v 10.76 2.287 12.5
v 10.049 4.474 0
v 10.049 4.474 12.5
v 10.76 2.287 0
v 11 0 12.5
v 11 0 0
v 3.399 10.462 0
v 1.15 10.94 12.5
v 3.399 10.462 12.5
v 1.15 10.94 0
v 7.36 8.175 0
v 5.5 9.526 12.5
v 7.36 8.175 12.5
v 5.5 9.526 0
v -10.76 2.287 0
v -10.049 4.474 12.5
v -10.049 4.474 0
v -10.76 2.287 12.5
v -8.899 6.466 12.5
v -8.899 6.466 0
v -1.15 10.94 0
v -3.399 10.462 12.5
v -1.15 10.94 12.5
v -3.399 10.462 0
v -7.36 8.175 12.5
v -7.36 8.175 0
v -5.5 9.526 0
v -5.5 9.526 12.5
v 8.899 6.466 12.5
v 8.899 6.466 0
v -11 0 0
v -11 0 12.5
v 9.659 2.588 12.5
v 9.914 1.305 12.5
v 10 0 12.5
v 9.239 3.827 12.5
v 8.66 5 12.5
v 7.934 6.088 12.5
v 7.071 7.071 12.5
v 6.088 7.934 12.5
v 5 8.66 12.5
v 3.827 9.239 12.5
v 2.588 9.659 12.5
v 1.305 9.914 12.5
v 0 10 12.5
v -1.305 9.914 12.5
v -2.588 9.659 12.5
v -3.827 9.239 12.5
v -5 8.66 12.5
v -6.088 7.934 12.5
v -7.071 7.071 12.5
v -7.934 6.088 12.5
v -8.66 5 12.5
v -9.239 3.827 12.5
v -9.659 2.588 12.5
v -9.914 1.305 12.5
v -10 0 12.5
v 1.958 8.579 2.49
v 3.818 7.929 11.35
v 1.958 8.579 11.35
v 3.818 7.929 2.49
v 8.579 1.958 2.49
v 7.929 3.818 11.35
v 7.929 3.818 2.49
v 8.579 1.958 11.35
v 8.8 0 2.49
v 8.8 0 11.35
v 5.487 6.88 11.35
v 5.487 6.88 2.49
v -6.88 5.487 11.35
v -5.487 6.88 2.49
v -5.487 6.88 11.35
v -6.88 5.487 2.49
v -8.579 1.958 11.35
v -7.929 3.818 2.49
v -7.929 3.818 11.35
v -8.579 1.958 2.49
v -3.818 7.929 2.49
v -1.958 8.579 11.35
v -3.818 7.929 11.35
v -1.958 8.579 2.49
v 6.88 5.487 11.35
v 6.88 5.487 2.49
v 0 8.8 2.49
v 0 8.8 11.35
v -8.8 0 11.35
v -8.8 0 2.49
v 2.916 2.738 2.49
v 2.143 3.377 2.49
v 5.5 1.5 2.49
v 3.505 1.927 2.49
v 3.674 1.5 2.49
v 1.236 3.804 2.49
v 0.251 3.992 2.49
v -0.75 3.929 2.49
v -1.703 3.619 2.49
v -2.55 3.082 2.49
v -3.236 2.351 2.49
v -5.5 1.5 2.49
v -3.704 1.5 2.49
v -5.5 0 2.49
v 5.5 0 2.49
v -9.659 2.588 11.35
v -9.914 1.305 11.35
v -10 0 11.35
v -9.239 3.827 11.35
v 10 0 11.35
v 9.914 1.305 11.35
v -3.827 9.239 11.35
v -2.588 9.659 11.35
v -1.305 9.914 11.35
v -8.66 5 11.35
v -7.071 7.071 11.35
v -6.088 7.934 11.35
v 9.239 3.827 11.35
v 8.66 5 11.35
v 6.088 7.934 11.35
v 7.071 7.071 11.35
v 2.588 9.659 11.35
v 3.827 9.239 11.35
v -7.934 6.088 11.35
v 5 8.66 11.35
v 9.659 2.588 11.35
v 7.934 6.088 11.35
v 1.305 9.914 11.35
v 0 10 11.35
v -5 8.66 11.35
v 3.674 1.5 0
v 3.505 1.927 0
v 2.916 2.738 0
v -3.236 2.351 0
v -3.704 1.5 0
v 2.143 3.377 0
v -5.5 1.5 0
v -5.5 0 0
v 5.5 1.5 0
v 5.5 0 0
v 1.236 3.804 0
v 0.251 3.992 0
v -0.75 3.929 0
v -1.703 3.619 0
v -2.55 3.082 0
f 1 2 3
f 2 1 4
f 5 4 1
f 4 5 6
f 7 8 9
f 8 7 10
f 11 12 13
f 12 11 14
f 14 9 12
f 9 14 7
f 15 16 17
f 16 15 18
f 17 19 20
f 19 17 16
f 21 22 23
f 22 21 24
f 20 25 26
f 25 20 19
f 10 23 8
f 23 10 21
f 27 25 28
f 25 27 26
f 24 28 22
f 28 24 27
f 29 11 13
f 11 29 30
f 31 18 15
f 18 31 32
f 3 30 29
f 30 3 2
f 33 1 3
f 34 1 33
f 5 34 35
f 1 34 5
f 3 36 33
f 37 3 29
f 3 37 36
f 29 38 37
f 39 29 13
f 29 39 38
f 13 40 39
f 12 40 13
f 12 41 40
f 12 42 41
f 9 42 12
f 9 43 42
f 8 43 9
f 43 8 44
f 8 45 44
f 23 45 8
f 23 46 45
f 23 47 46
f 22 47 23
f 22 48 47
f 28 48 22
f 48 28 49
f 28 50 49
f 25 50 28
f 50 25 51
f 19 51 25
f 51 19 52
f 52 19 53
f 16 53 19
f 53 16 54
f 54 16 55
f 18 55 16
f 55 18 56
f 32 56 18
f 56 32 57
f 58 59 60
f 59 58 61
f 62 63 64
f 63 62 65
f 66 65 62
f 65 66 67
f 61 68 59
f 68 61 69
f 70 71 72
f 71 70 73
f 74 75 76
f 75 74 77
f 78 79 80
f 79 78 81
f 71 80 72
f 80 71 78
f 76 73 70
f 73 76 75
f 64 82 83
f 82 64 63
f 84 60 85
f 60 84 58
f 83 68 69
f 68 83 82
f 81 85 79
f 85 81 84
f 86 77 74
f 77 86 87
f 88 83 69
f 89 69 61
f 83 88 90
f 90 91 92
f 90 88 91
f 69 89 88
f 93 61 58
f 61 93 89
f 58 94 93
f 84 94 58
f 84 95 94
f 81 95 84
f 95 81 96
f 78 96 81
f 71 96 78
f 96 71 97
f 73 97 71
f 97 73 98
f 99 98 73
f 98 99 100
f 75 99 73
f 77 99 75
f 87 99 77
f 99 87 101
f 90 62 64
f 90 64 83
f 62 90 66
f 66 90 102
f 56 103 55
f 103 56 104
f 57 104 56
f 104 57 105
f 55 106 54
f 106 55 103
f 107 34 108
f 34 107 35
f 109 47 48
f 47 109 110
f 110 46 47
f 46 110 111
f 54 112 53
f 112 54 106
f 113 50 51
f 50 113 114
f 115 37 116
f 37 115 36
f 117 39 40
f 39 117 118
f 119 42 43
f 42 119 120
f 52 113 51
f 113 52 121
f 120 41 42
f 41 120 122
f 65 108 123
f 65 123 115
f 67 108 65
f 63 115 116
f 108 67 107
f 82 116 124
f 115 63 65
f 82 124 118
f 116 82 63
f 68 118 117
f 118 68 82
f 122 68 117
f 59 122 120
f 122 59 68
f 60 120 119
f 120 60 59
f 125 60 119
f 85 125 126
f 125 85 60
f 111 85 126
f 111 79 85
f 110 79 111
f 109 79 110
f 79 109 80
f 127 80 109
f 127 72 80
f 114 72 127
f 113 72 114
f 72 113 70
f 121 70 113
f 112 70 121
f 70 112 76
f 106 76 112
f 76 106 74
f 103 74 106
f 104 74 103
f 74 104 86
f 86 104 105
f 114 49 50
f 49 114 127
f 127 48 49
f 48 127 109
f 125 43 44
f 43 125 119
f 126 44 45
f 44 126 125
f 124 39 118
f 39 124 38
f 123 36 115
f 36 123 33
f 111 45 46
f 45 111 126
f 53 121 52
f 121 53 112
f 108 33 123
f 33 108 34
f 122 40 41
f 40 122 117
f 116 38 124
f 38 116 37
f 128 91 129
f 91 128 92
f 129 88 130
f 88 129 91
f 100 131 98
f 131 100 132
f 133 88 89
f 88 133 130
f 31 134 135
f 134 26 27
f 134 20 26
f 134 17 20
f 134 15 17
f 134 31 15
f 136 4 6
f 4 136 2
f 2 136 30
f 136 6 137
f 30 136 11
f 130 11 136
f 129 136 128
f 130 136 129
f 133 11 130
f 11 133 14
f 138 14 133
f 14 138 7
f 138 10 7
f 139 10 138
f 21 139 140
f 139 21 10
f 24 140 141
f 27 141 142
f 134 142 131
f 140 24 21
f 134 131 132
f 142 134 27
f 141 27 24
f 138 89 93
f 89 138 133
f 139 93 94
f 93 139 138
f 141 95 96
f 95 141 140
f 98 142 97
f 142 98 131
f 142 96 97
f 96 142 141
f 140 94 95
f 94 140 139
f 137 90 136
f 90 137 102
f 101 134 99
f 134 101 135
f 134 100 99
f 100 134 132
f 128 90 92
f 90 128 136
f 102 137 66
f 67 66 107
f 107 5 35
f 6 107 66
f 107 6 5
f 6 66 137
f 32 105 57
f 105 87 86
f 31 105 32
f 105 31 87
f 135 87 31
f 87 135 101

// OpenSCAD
// Lens
lens_ridge_d = 20;
lens_ridge_l = 1.15;

lens_front_d = 17.6;
lens_front_l = 1;

lens_cone_l = 11 - (lens_ridge_l + lens_front_l);

lens_aperture_d = 6;

lens_total_l = lens_cone_l + lens_ridge_l + lens_front_l;

// LED Star Board
board_d = 20;
board_t = 1.22;
castelations = 6;
castelation_r = 2.5;

led_d = 8;
led_h = 2.5; // just body, not bubble
led_lead_w = 3;
led_lead_l = 1.5;
led_bubble_d = 5.5;

// other

// housing_addt = 1;
housing_addt = 0;
// housing_l = lens_total_l+board_t+led_h + housing_addt;
housing_l = lens_cone_l+lens_ridge_l+board_t+led_h + housing_addt;
housing_d = lens_ridge_d + 2;

ff = 0.01;

module lens() {
  cylinder(d=lens_front_d, h=lens_front_l);
  translate([0, 0, lens_front_l]) {
    cylinder(d=lens_ridge_d, h=lens_ridge_l, $fn=48);
      translate([0, 0, lens_ridge_l]) {
        cylinder(d2=lens_aperture_d, d1=lens_front_d, h=lens_cone_l);
      }
  }
}

module star_board(include_castelations=true) {
  difference() {
    cylinder(d=board_d, h=board_t, $fn=48);
    if (include_castelations) {
      for(deg=[0:(360/castelations):360]) {
        rotate([0, 0, deg]) translate([board_d/2, 0, -ff]) cylinder(r=castelation_r, h=board_t+(ff*2));
      }
    }
  }
  translate([0, 0, board_t]) led();
}

module led() {
  cylinder(d=led_d, h=led_h, $fn=25);
  translate([-((led_lead_l*2)+led_d)/2, -led_lead_w/2, 0]) cube([(led_lead_l*2)+led_d, led_lead_w, led_h]);
  translate([0, 0, led_h]) sphere(d=led_bubble_d, $fn=16);
}

module lens_and_led(include_castelations=true) {
  translate([0, 0, lens_total_l+board_t+led_h]) rotate([0, 180, 0]) lens();
  star_board(include_castelations);
}

module housing_cutouts_mock() {
  // pcb cutout
    translate([0, 0, 0]) cylinder(d=board_d, h=board_t);
    // ridge cutout
    translate([0, 0, board_t+led_h+lens_cone_l]) cylinder(d=lens_ridge_d, h=lens_ridge_l);
    // led cutout
    translate([0, 0, board_t]) led();
}

module housing_cutouts_real() {
  translate([0, 0, 0])
      lens_and_led(include_castelations=false);
}

module housing() {
  difference() {
    union() {
      difference() {
        cylinder(d=housing_d, h=housing_l);

        // centre channel
        translate([0, 0, -ff]) cylinder(d=lens_front_d, h=housing_l+(ff*2));
      }

      translate([0, 0, board_t]) {
        cylinder(d=lens_front_d, h=led_h-ff);
      }
    }

    translate([0, 0, housing_addt])
      // housing_cutouts_mock();
      housing_cutouts_real();
  }

}

// lens();
// led();
// star_board();
// translate([0, 0, housing_addt])
//   %lens_and_led();
intersection() {
  translate([-housing_d/2, 0, 0]) cube([housing_d, housing_d/2, housing_l+(ff*2)]);
  translate([0, 0, -board_t])
    housing();
}
